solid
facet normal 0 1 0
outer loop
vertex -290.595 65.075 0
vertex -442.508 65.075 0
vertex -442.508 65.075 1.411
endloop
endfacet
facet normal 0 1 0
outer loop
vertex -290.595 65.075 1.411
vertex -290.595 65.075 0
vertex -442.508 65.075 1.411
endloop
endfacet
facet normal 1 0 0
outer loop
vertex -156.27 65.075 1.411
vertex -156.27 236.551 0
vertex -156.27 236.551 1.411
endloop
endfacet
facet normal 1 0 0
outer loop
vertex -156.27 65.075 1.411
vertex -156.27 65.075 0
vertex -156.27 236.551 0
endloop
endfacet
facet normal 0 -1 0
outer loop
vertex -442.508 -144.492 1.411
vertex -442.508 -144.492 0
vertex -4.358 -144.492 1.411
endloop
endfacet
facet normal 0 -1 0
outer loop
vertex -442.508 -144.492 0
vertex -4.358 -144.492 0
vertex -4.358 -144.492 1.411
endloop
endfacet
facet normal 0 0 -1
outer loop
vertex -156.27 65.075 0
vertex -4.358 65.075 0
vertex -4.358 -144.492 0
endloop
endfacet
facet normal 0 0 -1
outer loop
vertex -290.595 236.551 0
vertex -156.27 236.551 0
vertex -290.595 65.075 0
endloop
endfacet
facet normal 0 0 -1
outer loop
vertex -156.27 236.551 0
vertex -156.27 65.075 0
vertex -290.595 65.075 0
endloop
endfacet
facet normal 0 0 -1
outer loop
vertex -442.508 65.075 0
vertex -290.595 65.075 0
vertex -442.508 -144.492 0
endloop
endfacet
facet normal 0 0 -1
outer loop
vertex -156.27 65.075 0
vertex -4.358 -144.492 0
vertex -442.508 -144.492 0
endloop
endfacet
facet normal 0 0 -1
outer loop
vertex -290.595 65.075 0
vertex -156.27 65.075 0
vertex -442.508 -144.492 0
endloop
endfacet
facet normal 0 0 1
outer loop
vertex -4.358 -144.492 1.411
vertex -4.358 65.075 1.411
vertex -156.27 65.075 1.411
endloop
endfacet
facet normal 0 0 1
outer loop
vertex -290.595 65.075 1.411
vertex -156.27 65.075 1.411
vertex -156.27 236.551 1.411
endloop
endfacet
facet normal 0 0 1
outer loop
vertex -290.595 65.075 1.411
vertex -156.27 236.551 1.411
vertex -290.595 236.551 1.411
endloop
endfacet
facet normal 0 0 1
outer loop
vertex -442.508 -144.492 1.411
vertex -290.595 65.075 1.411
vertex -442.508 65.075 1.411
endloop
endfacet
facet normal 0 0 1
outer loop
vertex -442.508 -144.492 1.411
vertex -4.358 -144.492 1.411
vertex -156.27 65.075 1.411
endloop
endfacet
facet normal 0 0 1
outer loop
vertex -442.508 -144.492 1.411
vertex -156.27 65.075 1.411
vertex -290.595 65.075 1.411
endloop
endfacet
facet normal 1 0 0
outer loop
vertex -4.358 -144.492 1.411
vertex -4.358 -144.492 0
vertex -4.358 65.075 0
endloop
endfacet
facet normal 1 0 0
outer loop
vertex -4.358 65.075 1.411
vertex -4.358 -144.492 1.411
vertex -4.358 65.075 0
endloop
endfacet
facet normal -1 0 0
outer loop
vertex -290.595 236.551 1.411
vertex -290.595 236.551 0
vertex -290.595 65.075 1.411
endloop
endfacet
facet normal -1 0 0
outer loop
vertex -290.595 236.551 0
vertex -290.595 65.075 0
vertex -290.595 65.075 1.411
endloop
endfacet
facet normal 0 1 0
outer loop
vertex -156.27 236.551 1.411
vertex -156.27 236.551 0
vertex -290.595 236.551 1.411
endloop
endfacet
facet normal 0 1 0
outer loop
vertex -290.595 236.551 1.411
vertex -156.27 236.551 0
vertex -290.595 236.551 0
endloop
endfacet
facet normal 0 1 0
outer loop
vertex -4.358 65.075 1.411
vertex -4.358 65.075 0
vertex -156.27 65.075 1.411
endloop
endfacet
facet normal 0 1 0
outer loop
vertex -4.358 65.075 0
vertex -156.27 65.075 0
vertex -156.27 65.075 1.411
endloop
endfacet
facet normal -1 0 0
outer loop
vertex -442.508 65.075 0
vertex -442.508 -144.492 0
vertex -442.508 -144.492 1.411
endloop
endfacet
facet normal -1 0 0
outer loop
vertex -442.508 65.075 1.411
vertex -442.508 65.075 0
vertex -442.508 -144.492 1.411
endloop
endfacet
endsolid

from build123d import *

# Parameters (mm, degrees)
F1_DEPTH = 1.4111111111
F2_DEPTH = 101.2317
F3_DEPTH = 66.675
F4_DEPTH = 66.675
F5_DEPTH = 47.498


# Not quite as in the source:
# - a length typed as a fraction of an inch, garbled in the dataset ("3 / 203.2 mm" for 3/8 in), is restored


with BuildPart() as f1:
    # F0 (on Top) → F1 (new body)
    with BuildSketch(Plane.XY):
        Polygon((-156.2699383586, 189.0532364881), (-290.5952983586, 189.0532364881), (-290.5952983586, -36.1571907997), (-375.8326183586, -36.1571907997), (-375.8326183586, -144.4919435119), (-71.0326183586, -144.4919435119), (-71.0326183586, -36.1571907997), (-156.2699383586, -36.1571907997), align=None)
    extrude(amount=F1_DEPTH)

    # F2 (add): faces of the model
    f2_faces = [f1.faces().sort_by_distance(p)[0] for p in [
        (-333.2139583586, -36.1571907997, 0.7055555556),
        (-113.6512783586, -36.1571907997, 0.7055555556),
    ]]
    extrude(f2_faces, amount=F2_DEPTH)

    # F3 (add): a face of the model
    f3_faces = [f1.faces().sort_by_distance(p)[0] for p in [
        (-71.0326183586, -39.7087171558, 0.7055555556),
    ]]
    extrude(f3_faces, amount=F3_DEPTH)

    # F4 (add): a face of the model
    f4_faces = [f1.faces().sort_by_distance(p)[0] for p in [
        (-375.8326183586, -39.7087171558, 0.7055555556),
    ]]
    extrude(f4_faces, amount=F4_DEPTH)

    # F5 (add): a face of the model
    f5_faces = [f1.faces().sort_by_distance(p)[0] for p in [
        (-223.4326183586, 189.0532364881, 0.7055555556),
    ]]
    extrude(f5_faces, amount=F5_DEPTH)


solid = f1.part
